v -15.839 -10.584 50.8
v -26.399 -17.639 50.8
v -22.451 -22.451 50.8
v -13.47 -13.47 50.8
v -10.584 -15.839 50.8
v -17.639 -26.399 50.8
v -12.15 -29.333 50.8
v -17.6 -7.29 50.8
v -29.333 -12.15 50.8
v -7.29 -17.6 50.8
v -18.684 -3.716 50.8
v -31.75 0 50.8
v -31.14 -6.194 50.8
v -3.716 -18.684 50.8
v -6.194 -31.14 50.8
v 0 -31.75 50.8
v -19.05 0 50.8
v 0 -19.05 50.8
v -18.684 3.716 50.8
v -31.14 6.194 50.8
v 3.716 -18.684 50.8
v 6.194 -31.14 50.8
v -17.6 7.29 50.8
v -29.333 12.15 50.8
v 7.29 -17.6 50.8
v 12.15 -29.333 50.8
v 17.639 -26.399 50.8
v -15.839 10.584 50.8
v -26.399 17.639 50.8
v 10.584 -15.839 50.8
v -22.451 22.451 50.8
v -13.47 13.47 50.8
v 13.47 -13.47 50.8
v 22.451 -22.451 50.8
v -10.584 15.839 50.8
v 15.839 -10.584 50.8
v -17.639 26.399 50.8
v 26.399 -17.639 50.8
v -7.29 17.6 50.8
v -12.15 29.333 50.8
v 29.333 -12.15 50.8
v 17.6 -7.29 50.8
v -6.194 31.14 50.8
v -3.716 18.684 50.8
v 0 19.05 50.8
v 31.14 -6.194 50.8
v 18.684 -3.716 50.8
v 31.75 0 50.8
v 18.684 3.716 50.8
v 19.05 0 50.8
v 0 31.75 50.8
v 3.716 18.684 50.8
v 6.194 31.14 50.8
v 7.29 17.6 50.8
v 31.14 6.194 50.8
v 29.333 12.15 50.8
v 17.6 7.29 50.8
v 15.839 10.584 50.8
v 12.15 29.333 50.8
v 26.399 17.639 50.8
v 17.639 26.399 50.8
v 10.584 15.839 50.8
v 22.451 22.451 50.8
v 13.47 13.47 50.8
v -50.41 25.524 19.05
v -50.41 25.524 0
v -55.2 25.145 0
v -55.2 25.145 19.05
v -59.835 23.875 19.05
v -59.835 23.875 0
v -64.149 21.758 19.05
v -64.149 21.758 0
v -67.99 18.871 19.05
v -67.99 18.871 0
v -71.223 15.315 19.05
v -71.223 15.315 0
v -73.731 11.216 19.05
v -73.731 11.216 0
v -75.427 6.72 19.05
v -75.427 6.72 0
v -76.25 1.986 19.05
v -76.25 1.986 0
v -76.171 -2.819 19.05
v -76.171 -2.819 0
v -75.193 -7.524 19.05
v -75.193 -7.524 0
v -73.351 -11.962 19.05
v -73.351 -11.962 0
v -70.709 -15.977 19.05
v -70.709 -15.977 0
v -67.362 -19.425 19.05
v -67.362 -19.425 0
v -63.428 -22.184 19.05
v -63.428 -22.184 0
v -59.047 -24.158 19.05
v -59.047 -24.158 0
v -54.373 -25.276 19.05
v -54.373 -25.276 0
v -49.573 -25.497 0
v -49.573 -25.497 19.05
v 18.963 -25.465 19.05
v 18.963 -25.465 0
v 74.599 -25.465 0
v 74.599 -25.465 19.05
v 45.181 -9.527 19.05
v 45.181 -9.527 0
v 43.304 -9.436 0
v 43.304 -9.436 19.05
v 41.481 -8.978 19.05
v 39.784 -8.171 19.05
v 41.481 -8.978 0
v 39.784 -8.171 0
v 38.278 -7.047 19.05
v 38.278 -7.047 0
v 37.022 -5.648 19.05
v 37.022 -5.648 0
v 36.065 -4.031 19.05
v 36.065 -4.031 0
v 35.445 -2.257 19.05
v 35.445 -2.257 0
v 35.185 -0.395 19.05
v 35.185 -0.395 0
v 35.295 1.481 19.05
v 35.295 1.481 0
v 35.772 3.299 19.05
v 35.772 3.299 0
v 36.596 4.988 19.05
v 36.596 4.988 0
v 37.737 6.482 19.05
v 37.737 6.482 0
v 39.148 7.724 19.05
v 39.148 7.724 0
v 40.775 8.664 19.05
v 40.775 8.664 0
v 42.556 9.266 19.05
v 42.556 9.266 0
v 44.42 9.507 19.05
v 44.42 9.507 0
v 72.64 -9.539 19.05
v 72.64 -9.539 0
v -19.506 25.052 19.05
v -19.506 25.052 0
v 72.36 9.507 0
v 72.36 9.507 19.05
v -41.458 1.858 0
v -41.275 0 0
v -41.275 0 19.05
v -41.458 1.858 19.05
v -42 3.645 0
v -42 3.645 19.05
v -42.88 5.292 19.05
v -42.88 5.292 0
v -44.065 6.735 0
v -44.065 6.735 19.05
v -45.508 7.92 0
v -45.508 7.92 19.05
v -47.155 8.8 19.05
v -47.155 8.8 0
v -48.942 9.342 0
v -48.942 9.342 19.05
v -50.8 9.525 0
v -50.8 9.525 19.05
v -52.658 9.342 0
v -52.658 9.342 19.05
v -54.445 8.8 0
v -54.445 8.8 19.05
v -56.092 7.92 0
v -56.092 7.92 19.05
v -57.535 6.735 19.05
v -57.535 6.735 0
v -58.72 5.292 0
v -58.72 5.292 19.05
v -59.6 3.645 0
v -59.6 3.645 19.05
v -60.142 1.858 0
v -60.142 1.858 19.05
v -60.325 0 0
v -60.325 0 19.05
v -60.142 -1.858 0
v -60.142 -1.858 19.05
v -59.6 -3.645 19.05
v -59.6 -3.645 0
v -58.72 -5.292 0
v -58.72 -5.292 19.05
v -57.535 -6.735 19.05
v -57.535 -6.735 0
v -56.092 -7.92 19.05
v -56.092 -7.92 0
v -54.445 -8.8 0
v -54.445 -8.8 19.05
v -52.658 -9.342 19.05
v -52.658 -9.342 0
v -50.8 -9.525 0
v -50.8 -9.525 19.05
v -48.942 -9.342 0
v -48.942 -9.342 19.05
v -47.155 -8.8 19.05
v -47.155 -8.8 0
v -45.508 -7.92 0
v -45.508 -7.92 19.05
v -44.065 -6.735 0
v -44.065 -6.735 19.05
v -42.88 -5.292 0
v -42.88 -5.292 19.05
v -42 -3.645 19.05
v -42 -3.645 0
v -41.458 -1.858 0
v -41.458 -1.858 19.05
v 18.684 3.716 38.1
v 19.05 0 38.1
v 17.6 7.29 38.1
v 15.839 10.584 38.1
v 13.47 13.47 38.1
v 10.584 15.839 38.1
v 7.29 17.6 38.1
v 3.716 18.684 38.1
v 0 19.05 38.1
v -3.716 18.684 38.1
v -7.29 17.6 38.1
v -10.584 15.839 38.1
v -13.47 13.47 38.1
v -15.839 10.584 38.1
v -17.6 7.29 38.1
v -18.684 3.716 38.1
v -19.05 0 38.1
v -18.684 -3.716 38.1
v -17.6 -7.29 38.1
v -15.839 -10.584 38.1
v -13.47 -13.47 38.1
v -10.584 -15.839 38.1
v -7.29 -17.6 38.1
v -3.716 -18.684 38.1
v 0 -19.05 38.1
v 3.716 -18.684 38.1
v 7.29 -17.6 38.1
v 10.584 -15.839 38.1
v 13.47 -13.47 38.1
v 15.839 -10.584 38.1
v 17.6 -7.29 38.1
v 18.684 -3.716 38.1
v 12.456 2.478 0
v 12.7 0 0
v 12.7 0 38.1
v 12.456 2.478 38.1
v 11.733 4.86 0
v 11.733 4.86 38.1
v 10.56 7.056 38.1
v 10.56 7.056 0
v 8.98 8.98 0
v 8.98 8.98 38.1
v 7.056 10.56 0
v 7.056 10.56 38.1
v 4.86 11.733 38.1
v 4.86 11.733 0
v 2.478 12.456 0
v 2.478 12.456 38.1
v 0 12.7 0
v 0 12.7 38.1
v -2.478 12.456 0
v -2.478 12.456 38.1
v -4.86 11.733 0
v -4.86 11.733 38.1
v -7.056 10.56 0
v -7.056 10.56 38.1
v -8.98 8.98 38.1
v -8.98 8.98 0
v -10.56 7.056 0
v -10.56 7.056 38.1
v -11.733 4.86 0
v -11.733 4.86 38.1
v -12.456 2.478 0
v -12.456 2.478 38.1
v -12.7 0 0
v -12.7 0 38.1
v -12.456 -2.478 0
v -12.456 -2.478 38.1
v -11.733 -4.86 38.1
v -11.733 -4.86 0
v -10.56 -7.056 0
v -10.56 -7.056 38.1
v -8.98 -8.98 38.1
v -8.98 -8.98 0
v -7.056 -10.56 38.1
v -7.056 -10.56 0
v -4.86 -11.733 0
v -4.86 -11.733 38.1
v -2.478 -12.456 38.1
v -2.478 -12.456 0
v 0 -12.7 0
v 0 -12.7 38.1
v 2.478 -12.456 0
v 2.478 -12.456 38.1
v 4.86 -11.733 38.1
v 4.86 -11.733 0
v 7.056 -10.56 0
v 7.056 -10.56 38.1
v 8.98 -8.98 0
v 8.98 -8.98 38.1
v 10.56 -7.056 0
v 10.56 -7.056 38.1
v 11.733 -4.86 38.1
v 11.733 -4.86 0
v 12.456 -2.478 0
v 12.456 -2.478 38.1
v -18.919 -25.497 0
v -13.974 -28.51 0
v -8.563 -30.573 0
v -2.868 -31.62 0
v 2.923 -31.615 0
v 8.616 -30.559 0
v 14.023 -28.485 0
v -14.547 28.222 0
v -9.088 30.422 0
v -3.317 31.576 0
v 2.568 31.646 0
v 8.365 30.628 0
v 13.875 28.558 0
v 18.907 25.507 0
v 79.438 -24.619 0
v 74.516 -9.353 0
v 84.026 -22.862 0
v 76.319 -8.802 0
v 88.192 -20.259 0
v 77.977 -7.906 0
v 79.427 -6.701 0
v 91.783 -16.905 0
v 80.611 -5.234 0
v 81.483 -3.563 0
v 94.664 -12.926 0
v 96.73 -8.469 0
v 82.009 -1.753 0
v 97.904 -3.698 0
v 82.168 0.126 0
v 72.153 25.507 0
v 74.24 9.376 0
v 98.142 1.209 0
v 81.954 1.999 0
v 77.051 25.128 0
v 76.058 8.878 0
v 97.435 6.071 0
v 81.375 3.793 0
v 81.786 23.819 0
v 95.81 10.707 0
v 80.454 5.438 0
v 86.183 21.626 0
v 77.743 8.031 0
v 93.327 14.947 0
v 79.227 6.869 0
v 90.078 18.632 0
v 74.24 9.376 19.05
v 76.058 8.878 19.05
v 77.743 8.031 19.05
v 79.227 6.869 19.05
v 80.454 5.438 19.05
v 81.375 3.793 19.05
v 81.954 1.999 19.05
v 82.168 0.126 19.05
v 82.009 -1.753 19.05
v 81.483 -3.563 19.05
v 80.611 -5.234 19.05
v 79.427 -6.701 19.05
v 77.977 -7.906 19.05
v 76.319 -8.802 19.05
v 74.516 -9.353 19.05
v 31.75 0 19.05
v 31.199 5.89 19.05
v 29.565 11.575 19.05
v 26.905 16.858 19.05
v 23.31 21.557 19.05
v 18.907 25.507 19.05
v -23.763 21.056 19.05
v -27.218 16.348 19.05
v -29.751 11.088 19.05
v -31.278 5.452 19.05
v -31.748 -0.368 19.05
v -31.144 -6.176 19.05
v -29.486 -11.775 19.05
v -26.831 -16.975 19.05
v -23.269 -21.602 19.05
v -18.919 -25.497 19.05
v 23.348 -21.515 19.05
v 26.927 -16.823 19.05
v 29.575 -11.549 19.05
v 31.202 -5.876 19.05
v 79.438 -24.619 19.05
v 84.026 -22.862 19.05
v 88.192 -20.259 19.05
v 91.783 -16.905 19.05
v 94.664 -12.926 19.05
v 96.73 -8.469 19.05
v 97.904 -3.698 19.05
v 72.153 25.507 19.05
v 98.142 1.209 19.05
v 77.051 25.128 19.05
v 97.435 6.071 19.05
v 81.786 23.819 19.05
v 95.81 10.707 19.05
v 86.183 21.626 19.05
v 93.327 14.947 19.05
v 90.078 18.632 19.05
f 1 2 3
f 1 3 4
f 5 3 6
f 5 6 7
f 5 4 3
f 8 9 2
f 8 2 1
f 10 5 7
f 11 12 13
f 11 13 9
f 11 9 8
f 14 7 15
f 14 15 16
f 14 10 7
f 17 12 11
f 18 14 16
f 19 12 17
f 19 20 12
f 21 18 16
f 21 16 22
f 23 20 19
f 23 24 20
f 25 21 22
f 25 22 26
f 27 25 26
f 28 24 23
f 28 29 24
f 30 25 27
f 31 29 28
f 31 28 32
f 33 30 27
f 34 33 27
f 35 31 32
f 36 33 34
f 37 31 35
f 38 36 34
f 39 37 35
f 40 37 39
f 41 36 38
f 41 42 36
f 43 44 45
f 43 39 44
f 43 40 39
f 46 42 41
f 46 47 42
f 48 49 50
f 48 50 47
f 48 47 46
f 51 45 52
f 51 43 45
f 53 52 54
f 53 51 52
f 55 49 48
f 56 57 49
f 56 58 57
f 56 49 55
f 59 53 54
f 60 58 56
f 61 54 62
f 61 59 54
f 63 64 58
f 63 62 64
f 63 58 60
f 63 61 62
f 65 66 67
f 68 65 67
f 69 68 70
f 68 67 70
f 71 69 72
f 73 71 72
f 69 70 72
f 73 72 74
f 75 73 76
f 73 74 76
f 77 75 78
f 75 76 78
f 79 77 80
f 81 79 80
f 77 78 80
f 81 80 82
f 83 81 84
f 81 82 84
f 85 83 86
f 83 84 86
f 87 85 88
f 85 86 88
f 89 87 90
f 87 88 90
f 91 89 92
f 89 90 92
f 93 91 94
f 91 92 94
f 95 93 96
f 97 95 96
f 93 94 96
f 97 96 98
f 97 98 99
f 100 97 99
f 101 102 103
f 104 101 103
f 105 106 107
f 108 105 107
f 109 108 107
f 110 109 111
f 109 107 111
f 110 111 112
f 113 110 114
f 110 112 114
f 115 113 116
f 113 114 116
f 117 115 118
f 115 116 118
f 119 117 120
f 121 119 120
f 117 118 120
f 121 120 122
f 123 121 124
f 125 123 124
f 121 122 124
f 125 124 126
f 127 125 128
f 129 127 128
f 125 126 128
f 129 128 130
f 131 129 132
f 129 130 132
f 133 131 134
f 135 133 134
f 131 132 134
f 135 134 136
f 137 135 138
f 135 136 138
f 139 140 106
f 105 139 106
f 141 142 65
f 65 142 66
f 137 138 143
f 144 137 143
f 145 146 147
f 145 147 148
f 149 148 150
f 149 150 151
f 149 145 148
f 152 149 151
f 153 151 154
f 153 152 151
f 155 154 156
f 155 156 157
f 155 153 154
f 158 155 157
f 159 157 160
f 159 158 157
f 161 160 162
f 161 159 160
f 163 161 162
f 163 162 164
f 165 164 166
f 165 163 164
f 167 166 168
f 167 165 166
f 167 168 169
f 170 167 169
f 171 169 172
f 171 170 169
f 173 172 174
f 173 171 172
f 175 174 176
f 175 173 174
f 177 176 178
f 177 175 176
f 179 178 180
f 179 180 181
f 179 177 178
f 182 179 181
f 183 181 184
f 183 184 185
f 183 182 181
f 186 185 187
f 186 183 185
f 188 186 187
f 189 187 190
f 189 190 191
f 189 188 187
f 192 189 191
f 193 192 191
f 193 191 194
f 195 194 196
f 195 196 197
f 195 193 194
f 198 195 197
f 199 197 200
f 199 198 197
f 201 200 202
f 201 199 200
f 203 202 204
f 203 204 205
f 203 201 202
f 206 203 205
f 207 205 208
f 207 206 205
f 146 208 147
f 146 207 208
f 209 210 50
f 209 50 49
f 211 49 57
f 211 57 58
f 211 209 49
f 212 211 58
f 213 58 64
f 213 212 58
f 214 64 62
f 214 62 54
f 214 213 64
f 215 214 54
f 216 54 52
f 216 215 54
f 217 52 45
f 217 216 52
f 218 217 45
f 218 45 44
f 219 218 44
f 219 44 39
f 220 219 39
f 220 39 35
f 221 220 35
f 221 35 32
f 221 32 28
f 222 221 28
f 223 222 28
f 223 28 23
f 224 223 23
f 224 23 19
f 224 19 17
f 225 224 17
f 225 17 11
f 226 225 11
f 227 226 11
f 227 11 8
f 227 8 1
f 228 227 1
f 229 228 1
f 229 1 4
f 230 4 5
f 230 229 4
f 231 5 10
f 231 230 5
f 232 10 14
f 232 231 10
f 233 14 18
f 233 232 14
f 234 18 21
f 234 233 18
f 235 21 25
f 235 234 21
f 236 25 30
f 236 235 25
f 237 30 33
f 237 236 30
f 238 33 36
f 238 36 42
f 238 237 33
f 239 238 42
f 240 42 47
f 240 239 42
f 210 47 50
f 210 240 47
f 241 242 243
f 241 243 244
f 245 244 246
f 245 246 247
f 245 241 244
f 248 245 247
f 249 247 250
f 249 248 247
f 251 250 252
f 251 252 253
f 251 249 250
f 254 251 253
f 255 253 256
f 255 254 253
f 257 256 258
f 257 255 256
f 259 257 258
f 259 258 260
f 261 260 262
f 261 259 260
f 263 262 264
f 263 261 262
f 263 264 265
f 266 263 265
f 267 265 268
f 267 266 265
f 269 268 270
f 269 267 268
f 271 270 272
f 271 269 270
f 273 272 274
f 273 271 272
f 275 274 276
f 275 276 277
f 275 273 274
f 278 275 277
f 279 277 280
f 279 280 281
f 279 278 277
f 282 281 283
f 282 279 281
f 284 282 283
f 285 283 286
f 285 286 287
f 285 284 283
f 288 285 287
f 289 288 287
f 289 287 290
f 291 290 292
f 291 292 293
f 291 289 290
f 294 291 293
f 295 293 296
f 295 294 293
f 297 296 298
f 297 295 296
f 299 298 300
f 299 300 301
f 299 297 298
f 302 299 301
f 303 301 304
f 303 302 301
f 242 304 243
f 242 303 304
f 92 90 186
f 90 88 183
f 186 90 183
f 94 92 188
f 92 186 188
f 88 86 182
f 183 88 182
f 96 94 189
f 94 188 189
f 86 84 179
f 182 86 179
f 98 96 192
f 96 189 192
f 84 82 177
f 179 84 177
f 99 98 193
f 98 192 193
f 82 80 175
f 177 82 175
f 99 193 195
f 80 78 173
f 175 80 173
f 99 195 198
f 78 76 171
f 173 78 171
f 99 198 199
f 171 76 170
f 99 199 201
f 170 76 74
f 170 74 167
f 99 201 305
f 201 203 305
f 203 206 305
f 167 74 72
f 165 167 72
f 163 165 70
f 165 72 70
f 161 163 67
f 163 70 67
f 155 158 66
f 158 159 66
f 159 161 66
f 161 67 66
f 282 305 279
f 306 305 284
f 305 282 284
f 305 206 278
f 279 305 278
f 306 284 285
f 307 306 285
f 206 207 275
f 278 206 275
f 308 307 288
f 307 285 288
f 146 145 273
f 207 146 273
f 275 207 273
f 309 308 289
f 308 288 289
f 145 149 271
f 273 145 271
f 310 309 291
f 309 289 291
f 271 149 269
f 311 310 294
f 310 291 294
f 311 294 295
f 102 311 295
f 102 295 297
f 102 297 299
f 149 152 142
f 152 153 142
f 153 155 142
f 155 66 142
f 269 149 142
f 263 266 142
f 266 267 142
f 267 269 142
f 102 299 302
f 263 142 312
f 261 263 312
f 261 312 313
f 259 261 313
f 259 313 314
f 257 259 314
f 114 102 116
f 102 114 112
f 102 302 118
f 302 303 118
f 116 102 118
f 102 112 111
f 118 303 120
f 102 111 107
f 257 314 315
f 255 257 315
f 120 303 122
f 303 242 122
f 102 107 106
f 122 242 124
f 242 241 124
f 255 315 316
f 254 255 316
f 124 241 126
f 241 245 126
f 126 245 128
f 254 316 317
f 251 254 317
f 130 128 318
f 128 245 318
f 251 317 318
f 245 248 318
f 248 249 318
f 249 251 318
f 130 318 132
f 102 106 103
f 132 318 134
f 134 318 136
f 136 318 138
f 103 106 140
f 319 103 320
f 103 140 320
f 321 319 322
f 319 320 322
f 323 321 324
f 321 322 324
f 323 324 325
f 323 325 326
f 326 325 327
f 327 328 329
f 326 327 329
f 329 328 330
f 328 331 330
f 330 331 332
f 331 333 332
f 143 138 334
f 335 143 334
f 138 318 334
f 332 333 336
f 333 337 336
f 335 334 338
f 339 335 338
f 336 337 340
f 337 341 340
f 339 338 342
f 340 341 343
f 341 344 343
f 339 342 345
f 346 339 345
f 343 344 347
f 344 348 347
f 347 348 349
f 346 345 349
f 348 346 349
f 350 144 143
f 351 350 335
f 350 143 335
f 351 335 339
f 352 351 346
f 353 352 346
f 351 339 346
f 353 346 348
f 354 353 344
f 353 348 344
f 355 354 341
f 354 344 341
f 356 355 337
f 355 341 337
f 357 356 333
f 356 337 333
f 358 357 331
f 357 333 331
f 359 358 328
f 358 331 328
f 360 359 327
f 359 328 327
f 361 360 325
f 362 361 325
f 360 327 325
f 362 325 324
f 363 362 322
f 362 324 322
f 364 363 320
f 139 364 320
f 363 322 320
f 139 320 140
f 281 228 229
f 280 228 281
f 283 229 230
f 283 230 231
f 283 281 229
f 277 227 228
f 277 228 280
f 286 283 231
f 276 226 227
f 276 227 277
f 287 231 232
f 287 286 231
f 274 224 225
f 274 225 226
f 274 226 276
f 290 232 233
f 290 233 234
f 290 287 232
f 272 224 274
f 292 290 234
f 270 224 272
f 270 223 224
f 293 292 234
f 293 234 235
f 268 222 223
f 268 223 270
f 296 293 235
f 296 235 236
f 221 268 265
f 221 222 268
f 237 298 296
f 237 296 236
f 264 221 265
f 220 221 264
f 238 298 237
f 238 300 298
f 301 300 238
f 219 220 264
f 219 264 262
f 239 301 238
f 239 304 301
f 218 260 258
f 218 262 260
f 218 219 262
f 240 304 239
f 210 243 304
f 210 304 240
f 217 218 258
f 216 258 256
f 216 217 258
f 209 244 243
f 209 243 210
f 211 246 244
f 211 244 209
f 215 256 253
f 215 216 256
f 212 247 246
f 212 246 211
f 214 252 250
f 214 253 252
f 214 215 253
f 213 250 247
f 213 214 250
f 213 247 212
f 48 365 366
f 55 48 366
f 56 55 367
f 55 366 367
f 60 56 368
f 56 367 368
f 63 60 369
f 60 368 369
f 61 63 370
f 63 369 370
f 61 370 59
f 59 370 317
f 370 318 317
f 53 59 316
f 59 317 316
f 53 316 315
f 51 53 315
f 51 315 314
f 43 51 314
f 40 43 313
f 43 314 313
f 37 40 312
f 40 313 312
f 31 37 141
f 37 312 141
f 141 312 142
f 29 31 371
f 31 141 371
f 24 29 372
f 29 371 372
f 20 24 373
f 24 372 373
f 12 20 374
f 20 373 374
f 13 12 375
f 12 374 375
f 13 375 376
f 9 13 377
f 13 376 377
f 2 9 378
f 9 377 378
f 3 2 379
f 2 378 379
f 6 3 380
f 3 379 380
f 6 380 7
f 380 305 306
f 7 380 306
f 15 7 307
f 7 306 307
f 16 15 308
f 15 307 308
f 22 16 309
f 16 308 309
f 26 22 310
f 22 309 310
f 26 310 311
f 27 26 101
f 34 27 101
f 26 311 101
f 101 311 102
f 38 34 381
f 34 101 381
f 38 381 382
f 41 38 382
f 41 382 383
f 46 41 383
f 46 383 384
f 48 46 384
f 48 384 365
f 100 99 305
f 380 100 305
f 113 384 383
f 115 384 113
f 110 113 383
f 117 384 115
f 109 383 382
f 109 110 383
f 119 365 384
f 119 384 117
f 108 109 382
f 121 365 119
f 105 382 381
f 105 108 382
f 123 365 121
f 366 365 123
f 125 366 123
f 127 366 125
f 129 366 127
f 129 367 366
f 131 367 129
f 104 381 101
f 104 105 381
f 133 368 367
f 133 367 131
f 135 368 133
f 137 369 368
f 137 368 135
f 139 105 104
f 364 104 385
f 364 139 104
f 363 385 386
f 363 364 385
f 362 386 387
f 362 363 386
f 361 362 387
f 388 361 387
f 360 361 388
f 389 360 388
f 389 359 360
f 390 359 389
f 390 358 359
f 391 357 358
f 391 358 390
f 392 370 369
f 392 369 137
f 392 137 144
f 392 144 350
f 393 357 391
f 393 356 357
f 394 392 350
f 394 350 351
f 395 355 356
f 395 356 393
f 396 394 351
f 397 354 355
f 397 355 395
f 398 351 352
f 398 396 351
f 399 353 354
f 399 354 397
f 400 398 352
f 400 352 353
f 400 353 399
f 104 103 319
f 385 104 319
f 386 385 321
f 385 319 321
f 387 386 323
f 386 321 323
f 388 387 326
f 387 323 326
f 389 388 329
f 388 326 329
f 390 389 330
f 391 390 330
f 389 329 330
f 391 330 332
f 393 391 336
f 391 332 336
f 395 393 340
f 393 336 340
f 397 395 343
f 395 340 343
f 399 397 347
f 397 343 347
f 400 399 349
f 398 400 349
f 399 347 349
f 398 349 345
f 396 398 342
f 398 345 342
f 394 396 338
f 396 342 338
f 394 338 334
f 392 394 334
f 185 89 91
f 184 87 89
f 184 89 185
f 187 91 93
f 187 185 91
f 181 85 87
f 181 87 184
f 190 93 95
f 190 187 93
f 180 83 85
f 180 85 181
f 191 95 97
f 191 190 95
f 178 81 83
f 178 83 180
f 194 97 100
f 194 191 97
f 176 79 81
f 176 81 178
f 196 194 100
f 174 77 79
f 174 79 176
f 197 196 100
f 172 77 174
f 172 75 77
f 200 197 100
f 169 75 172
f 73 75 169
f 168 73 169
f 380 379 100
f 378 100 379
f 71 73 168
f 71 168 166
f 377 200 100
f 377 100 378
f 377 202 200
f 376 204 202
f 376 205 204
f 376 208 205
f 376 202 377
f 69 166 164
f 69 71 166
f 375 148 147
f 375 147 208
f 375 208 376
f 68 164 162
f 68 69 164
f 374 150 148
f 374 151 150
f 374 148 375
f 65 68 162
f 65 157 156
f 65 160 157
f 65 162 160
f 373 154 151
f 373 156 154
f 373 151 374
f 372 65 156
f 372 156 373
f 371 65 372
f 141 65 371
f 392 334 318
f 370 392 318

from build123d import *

# Parameters (mm, degrees)
F1_R     = 31.75
F1_R_2   = 19.05
F4_DEPTH = 50.8
F2_R     = 19.05
F2_R_2   = 12.7
F5_DEPTH = 38.1
F6_DEPTH = 19.05
F3_R     = 9.525
F7_DEPTH = 19.05


with BuildPart() as f4:
    # F1 (on Top) → F4 (new body)
    with BuildSketch(Plane.XY):
        Circle(F1_R)
        Circle(F1_R_2, mode=Mode.SUBTRACT)
    extrude(amount=F4_DEPTH)

    # F2 (on face) → F5 (join)
    with BuildSketch(Plane.XY):
        Circle(F2_R)
        Circle(F2_R_2, mode=Mode.SUBTRACT)
    extrude(amount=F5_DEPTH)

    # F0 (on Top) → F6 (join)
    with BuildSketch(Plane.XY):
        with BuildLine():
            ThreePointArc((18.9071120655, 25.5065405992), (28.3580967986, 14.2786850221), (31.75, 0))
            ThreePointArc((31.75, 0), (28.3738258286, -14.2474035476), (18.9633223402, -25.4647777493))
            Line((18.9633223402, -25.4647777493), (74.598514582, -25.4647777493))
            ThreePointArc((74.598514582, -25.4647777493), (98.1416650574, 1.2092358238), (72.1527459753, 25.5065405992))
            Line((72.1527459753, 25.5065405992), (18.9071120655, 25.5065405992))
        make_face()
        with BuildLine():
            ThreePointArc((45.1813528665, -9.5272837666), (35.1847662251, -0.3951371067), (44.4197335774, 9.5065407864))
            Line((44.4197335774, 9.5065407864), (72.3597335774, 9.5065407864))
            ThreePointArc((72.3597335774, 9.5065407864), (82.1679704992, 0.1258636982), (72.6398616433, -9.5392154931))
            Line((72.6398616433, -9.5392154931), (45.1813528665, -9.5272837666))
        make_face(mode=Mode.SUBTRACT)
    extrude(amount=F6_DEPTH)

    # F3 (on face) → F7 (join)
    with BuildSketch(Plane.XY):
        with BuildLine():
            Line((-49.5730978943, -25.4974987052), (-18.9193038925, -25.4974987052))
            ThreePointArc((-18.9193038925, -25.4974987052), (-31.7478647233, -0.3682193799), (-19.5055872667, 25.0518375649))
            Line((-19.5055872667, 25.0518375649), (-50.4100229924, 25.5240209789))
            ThreePointArc((-50.4100229924, 25.5240209789), (-76.3235664091, -0.41867262), (-49.5730978943, -25.4974987052))
        make_face()
        with Locations((-50.8, 0)):
            Circle(F3_R, mode=Mode.SUBTRACT)
    extrude(amount=F7_DEPTH)


solid = f4.part
